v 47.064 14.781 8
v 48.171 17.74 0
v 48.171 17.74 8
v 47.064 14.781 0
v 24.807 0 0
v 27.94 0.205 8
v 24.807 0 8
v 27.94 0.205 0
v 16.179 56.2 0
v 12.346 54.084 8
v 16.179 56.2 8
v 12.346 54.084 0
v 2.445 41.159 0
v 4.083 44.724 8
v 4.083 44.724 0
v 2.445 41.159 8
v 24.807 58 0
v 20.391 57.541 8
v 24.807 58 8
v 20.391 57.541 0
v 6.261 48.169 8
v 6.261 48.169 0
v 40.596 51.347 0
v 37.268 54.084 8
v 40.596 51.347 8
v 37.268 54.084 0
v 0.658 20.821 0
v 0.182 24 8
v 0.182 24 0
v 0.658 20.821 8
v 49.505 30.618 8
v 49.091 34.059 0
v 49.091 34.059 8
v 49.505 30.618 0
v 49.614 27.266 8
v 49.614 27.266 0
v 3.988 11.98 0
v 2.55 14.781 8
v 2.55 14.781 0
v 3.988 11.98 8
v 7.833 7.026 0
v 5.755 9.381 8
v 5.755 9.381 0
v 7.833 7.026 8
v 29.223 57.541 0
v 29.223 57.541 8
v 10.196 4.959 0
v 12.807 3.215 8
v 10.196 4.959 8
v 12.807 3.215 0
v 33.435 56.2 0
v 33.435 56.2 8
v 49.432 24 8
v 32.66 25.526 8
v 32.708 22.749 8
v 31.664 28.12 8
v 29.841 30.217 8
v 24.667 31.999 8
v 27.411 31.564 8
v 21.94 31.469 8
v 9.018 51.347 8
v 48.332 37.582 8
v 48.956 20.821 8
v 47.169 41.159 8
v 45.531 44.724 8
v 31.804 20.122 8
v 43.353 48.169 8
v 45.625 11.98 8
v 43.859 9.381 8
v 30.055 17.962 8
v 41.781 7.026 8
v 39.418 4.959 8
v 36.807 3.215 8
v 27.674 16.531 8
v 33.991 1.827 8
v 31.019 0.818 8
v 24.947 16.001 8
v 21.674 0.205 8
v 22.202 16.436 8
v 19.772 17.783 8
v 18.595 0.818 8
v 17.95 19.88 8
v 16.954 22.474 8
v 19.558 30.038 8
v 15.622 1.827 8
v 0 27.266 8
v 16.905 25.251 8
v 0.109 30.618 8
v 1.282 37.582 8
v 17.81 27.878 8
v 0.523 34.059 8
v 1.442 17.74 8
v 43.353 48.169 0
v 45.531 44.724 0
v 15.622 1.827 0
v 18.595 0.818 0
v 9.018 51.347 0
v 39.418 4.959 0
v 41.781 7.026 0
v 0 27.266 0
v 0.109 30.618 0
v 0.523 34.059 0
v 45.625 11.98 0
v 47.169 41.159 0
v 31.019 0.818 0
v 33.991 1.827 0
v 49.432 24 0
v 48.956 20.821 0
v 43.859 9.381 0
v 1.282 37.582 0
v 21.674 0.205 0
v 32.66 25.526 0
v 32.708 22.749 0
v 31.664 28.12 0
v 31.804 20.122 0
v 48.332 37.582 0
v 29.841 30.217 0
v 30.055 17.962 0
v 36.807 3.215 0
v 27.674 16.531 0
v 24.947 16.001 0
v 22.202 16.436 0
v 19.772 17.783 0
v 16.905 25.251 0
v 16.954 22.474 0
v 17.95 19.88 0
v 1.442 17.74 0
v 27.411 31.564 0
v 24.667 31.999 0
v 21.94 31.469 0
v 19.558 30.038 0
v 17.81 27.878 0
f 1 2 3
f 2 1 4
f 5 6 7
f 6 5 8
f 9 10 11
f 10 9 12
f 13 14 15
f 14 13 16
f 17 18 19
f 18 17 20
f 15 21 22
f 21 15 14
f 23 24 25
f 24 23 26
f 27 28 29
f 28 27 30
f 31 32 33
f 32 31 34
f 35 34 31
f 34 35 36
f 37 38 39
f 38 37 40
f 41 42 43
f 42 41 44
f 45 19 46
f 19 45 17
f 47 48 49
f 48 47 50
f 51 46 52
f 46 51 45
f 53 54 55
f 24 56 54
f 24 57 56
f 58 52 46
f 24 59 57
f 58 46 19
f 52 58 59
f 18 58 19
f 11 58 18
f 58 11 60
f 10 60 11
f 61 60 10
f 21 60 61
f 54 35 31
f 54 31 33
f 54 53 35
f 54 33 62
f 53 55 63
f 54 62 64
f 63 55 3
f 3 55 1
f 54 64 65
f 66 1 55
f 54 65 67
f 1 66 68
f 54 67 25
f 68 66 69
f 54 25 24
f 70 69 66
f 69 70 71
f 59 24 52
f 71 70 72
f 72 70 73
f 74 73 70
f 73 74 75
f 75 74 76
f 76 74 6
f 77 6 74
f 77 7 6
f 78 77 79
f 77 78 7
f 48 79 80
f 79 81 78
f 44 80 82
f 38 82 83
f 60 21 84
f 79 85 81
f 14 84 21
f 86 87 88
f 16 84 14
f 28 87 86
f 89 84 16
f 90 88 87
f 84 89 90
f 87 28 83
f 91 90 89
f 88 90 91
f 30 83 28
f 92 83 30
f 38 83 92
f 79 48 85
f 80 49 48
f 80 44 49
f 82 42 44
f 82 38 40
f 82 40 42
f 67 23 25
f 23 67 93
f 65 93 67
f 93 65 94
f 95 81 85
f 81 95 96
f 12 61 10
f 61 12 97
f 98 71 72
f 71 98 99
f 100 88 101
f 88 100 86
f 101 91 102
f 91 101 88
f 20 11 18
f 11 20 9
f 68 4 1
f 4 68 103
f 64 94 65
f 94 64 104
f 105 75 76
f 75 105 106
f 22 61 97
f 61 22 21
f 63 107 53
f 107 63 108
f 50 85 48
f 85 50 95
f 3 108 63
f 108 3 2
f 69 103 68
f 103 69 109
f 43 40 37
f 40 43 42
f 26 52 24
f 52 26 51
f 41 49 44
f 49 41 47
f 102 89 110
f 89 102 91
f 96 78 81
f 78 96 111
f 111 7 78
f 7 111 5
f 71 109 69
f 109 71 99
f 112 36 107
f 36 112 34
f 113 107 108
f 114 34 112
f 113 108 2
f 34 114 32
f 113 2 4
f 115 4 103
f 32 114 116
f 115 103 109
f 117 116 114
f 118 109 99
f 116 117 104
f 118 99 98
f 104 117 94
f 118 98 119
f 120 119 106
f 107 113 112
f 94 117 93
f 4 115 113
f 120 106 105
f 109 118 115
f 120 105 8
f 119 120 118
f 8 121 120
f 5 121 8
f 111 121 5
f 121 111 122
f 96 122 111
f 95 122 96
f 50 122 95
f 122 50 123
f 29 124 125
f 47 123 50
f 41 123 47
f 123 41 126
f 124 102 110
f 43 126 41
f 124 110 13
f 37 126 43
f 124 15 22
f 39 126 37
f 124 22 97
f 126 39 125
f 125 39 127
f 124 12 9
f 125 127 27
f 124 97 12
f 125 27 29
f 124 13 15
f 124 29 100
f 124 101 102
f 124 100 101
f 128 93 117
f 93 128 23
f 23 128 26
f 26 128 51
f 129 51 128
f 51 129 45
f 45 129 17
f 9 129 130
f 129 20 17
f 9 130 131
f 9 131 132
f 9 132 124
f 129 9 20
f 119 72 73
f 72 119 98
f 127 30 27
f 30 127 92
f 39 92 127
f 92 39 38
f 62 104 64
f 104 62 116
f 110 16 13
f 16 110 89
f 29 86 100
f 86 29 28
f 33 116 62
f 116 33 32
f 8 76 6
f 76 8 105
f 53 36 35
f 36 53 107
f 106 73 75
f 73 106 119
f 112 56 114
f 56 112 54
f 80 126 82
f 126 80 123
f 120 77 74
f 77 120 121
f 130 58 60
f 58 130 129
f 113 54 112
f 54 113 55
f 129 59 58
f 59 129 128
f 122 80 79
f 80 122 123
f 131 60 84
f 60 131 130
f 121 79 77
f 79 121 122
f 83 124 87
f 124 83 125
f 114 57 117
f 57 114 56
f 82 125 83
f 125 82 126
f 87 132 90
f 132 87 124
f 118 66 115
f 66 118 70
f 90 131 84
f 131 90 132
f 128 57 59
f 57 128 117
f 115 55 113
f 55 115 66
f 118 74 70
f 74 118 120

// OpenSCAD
$fn = 32;

// ----------------------------------------------------------------------
// Cam plate: single_lobe cam, base R24
// ----------------------------------------------------------------------

// --- parameters (mm) ---
base_r = 24;              // base circle radius
lobe_h = 10;              // cam lobe rise
bore_r = 8;               // shaft bore radius
plate_t = 8;              // plate thickness, Z (extrusion height)
fit_tol = 0.1;            // declared fit tolerance (prompt contract)
free_tol = 0.5;           // declared free tolerance (prompt contract)

profile = [[49.432, 24], [49.614, 27.266], [49.505, 30.618], [49.091, 34.059], [48.332, 37.582], [47.169, 41.159], [45.531, 44.724], [43.353, 48.169], [40.596, 51.347], [37.268, 54.084], [33.435, 56.2], [29.223, 57.541], [24.807, 58], [20.391, 57.541], [16.179, 56.2], [12.346, 54.084], [9.018, 51.347], [6.261, 48.169], [4.083, 44.724], [2.445, 41.159], [1.282, 37.582], [0.523, 34.059], [0.109, 30.618], [0, 27.266], [0.182, 24], [0.658, 20.821], [1.442, 17.74], [2.55, 14.781], [3.988, 11.98], [5.755, 9.381], [7.833, 7.026], [10.196, 4.959], [12.807, 3.215], [15.622, 1.827], [18.595, 0.818], [21.674, 0.205], [24.807, 0], [27.94, 0.205], [31.019, 0.818], [33.991, 1.827], [36.807, 3.215], [39.418, 4.959], [41.781, 7.026], [43.859, 9.381], [45.625, 11.98], [47.064, 14.781], [48.171, 17.74], [48.956, 20.821]];  // primary outline, 48 points, counter clockwise
void_1 = [[32.66, 25.526], [31.664, 28.12], [29.841, 30.217], [27.411, 31.564], [24.667, 31.999], [21.94, 31.469], [19.558, 30.038], [17.81, 27.878], [16.905, 25.251], [16.954, 22.474], [17.95, 19.88], [19.772, 17.783], [22.202, 16.436], [24.947, 16.001], [27.674, 16.531], [30.055, 17.962], [31.804, 20.122], [32.708, 22.749]];  // shaft bore, 18 points

// --- the one profile operation ---
difference() {
  linear_extrude(height = plate_t) polygon(points = profile);
  translate([0, 0, -1])
    linear_extrude(height = plate_t + 2) polygon(points = void_1);
}
